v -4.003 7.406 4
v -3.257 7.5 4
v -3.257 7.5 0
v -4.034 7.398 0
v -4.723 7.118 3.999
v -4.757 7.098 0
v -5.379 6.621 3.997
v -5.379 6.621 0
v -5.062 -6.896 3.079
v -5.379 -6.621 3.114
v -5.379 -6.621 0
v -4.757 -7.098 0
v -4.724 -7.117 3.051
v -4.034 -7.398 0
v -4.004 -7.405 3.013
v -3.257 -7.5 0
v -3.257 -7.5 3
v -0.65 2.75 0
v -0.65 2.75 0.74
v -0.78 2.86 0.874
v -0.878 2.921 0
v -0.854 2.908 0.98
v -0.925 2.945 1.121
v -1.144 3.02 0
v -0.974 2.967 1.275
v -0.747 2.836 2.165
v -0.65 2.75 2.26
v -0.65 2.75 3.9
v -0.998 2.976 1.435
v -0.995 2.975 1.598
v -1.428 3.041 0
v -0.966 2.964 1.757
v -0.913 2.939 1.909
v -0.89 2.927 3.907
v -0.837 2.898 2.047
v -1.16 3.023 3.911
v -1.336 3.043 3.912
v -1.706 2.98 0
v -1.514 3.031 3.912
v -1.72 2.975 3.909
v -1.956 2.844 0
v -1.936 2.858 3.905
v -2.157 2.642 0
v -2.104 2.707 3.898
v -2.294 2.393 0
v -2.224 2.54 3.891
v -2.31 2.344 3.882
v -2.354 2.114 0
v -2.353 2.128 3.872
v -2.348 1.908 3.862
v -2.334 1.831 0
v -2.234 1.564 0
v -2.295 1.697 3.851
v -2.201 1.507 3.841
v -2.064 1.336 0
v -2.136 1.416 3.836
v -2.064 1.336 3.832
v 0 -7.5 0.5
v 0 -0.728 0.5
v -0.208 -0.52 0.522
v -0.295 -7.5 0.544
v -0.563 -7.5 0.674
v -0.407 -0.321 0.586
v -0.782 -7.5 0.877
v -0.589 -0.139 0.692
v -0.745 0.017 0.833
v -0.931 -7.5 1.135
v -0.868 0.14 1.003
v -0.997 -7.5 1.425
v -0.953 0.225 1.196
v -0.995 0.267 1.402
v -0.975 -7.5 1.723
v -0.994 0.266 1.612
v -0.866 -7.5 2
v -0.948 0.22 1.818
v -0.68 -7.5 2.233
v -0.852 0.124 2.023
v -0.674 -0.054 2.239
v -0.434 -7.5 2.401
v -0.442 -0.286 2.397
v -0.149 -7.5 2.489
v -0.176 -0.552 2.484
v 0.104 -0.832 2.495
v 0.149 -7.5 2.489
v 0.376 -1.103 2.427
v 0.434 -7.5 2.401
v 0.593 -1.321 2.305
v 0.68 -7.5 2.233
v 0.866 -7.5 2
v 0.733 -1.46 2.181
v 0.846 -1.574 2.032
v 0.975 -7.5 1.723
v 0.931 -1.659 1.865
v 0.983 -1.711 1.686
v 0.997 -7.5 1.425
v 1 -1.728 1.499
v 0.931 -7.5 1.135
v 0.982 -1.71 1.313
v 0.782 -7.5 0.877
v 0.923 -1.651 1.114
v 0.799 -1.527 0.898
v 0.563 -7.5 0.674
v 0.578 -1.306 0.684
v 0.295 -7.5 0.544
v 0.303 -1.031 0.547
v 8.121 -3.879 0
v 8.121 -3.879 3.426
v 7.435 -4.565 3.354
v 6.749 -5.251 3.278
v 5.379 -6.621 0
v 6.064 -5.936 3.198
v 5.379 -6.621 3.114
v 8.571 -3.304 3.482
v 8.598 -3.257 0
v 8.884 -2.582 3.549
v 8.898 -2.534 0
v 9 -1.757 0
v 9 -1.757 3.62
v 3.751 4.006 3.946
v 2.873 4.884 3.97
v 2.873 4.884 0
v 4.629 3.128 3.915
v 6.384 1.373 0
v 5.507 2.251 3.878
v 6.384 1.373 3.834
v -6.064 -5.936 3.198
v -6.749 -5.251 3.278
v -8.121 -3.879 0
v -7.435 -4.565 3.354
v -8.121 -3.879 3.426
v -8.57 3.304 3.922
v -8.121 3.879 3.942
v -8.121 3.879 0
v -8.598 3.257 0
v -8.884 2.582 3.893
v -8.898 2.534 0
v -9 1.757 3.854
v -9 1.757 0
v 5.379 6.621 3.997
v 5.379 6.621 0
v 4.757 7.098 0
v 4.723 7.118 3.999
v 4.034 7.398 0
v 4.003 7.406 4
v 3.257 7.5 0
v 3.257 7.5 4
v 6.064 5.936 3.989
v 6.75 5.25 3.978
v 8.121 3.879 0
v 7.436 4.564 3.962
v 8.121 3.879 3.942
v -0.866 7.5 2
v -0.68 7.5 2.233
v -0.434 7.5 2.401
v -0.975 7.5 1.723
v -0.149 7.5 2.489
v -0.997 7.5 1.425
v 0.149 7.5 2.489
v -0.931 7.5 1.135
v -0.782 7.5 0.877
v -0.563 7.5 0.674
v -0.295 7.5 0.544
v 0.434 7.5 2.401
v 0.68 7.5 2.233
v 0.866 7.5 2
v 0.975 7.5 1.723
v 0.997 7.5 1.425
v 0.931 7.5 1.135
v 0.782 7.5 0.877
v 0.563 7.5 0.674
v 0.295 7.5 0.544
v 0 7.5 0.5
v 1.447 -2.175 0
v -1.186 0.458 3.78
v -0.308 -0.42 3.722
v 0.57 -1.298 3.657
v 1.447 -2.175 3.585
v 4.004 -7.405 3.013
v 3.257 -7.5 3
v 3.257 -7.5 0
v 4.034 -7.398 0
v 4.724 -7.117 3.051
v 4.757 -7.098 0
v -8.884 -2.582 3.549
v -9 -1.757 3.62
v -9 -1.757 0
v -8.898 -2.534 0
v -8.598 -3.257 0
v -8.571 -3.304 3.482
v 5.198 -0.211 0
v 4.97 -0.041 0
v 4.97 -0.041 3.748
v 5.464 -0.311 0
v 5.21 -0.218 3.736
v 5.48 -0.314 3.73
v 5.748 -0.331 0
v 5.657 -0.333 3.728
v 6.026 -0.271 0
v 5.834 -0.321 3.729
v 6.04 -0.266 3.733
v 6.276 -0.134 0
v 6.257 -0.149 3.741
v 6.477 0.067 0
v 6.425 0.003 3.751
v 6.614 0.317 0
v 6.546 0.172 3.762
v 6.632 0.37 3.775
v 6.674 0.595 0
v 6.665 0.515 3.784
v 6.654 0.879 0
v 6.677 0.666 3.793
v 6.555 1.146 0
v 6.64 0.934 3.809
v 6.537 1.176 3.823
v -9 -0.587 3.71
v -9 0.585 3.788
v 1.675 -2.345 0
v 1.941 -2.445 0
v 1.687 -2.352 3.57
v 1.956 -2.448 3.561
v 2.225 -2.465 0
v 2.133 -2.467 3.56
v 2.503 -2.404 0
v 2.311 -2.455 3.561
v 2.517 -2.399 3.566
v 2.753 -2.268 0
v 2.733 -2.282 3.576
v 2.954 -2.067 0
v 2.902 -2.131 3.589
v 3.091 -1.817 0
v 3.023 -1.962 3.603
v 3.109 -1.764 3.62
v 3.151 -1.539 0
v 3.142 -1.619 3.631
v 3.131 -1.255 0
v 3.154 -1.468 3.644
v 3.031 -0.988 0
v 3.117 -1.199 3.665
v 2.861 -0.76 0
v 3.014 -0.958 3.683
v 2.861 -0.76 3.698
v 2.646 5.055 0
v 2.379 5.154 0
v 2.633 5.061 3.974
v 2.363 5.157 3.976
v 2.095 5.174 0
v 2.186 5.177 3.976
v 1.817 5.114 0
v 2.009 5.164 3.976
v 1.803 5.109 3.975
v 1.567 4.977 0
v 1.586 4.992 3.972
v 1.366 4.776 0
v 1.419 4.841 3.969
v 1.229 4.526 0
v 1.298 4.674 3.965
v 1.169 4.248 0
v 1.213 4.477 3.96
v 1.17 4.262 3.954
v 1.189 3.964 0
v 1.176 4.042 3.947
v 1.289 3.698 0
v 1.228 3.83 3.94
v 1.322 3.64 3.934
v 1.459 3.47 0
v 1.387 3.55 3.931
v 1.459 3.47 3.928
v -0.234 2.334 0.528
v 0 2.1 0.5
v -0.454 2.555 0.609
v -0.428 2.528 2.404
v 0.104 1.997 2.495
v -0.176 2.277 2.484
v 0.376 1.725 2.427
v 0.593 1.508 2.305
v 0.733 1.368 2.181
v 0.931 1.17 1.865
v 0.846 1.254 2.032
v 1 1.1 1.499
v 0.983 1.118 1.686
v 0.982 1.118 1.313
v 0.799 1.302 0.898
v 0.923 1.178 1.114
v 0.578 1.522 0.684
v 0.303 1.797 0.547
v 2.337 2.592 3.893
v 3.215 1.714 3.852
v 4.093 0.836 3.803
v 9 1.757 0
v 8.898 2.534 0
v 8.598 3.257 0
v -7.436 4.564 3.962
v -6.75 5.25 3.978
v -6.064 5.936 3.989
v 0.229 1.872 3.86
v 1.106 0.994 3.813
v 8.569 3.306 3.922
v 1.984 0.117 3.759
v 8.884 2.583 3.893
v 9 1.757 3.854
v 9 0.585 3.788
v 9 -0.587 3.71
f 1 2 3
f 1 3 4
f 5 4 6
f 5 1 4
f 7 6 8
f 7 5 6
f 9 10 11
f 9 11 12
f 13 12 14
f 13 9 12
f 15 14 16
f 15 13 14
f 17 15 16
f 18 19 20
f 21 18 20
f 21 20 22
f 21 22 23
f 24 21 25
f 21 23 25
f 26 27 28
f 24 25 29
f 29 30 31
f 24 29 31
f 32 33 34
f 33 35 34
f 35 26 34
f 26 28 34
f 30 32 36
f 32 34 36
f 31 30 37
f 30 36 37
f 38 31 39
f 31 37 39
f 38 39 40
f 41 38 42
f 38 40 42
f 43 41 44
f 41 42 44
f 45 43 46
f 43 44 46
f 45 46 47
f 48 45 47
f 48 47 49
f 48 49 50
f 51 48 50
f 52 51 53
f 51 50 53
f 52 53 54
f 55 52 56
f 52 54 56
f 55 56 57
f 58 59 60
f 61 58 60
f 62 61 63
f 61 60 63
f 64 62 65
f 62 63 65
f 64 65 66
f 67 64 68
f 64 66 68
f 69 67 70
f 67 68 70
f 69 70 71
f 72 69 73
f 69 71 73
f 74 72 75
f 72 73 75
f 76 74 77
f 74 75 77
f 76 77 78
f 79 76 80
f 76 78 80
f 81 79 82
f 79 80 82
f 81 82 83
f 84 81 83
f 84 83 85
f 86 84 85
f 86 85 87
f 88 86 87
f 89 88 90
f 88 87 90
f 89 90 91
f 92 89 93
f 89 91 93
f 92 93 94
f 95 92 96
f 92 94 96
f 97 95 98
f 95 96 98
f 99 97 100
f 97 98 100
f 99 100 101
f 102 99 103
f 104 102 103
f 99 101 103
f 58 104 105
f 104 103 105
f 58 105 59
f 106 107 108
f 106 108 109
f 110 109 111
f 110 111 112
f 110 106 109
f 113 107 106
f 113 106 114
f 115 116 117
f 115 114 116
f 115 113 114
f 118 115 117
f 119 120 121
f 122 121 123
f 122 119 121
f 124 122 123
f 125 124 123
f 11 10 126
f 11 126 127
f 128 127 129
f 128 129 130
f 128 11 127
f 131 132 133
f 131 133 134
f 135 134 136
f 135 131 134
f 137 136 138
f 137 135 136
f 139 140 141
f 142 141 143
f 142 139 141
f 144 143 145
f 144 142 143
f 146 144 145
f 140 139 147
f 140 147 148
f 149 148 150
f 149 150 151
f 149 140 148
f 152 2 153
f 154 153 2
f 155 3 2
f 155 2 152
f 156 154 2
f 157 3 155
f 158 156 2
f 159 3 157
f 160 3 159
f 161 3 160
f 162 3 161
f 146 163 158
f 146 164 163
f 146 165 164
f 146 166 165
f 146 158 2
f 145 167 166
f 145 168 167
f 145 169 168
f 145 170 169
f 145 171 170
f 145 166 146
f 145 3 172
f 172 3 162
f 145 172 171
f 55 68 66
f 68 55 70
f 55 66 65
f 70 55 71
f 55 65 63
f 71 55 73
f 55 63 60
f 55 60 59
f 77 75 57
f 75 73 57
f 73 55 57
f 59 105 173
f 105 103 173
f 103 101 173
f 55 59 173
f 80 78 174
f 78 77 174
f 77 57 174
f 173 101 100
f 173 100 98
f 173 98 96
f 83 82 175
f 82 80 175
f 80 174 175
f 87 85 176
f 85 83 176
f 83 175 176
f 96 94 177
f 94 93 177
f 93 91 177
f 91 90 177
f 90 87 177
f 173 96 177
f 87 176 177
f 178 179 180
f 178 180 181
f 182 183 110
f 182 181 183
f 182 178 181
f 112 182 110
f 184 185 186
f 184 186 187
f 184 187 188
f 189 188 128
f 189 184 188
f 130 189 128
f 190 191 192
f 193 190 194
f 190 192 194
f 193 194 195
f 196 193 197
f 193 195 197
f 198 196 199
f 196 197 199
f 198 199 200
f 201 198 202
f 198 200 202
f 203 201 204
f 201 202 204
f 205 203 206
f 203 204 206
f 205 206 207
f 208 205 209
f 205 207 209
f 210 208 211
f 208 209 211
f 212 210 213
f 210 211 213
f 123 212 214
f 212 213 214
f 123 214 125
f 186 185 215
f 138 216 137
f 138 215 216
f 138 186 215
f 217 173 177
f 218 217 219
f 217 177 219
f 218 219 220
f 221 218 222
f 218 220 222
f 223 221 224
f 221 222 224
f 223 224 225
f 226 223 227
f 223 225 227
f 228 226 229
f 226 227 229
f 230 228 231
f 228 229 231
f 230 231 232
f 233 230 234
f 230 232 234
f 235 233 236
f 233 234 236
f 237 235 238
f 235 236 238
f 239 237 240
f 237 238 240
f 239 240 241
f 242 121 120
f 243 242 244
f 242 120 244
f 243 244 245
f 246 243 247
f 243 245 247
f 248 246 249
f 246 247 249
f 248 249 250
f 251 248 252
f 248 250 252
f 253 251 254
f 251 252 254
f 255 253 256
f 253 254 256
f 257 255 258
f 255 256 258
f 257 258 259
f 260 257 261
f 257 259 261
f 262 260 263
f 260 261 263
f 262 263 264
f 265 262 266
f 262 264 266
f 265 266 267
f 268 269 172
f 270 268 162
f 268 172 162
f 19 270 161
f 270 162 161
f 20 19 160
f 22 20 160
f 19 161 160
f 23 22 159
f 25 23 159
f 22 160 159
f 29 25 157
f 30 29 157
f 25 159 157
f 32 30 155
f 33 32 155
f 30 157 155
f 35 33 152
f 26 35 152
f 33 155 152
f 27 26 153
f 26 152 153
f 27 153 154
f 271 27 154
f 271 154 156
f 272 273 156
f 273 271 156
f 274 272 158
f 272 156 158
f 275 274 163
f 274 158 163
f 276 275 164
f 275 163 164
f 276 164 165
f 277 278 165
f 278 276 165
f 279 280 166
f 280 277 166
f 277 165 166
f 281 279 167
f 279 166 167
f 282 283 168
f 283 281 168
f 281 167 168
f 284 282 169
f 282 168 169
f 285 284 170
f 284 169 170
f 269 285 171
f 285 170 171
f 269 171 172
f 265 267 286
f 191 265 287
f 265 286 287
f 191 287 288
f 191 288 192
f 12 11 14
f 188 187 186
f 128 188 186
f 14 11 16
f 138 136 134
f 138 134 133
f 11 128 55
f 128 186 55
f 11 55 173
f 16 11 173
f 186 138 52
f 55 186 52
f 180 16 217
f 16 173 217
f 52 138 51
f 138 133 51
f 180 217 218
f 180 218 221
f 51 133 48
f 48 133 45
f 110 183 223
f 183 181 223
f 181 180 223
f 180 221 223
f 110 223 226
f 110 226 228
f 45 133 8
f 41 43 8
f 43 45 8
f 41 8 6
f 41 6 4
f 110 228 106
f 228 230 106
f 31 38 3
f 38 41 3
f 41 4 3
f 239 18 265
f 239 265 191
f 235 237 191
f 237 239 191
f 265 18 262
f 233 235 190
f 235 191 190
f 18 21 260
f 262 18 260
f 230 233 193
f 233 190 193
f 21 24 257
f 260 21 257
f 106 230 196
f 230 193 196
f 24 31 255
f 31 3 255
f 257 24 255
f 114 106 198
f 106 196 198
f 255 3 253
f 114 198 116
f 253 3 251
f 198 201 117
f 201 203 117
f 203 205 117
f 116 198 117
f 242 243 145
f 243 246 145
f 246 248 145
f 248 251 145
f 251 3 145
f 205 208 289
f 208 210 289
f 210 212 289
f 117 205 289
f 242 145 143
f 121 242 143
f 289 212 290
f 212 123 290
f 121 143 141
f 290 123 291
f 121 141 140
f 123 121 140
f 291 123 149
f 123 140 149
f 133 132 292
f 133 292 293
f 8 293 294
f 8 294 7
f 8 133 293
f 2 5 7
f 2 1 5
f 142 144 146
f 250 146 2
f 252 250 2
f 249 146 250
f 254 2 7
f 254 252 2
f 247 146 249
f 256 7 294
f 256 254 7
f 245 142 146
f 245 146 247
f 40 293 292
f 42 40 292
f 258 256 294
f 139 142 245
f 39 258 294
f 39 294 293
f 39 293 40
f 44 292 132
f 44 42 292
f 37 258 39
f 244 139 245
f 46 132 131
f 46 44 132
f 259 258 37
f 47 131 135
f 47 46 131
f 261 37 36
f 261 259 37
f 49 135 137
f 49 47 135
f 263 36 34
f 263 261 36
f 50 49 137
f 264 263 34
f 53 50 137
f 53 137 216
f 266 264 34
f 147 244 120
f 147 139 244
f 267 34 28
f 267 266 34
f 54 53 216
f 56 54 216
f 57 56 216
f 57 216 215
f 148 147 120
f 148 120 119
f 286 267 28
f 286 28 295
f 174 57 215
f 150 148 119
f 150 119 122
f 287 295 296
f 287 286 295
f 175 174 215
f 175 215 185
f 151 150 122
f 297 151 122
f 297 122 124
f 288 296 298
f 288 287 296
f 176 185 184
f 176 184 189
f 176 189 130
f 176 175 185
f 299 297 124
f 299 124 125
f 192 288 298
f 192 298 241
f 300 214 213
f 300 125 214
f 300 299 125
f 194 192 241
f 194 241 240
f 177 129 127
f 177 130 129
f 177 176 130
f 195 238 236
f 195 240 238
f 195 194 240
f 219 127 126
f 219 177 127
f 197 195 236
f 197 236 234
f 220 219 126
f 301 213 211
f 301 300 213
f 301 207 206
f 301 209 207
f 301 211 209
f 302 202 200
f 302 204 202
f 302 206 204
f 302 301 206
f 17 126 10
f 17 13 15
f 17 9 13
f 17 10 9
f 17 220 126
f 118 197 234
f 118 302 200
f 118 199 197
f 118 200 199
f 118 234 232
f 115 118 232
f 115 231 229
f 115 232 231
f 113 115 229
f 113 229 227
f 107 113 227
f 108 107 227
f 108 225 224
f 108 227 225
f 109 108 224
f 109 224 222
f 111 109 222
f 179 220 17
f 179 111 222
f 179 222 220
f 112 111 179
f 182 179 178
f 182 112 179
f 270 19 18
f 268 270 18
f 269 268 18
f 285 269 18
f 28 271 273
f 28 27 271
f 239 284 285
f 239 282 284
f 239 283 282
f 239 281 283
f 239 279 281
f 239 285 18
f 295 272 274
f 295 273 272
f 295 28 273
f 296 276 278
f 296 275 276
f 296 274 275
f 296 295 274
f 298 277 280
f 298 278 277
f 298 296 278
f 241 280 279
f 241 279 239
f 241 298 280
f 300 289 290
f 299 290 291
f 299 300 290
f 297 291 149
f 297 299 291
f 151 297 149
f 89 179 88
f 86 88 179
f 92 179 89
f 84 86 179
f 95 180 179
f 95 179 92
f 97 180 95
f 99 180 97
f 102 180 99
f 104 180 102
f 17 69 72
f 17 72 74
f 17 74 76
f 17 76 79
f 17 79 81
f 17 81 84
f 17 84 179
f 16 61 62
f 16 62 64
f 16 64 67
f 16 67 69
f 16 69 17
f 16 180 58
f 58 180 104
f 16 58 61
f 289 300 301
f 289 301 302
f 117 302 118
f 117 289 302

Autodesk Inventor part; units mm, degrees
ref_plane "YZ Plane" through (0, 0, 0) normal (1, 0, 0) x (0, 1, 0)
ref_plane "XZ Plane" through (0, 0, 0) normal (0, 1, 0) x (-1, 0, 0)
ref_plane "XY Plane" through (0, 0, 0) normal (0, 0, 1) x (1, 0, 0)
sketch "Base" plane through (0, 0, 0) normal (0, 0, 1) x (1, 0, 0)
  line L0 (-9, -3) -> (-9, 3)
  line L1 (-9, 3) -> (-4.5, 7.5)
  line L2 (-4.5, 7.5) -> (4.5, 7.5)
  line L3 (4.5, 7.5) -> (9, 3)
  line L4 (9, 3) -> (9, -3)
  line L5 (9, -3) -> (4.5, -7.5)
  line L6 (4.5, -7.5) -> (-4.5, -7.5)
  line L7 (-4.5, -7.5) -> (-9, -3)
  line L8 (-9, 0) -> (9, 0) construction
  line L9 (0, 7.5) -> (0, -7.5) construction
  point P0 (0, 0)
  point P1 (0, 0)
  dimension "d1" = 18
  dimension "d5" = 15
  dimension "d7" = 6
extrude "BaseFeature" add sketch "Base" along normal blind 4
fillet "BaseFilletsFeature" radius 3 8 edges at (-9, -3, 2) (-4.5, -7.5, 2) (4.5, -7.5, 2) (9, -3, 2) (9, 3, 2) (4.5, 7.5, 2) (-4.5, 7.5, 2) (-9, 3, 2)
sketch "RailHoles" plane through (0, 0, 4) normal (0, 0, 1) x (1, 0, 0)
  line L0 (2.1663, 4.1769) -> (5.6769, 0.6663) construction
  line L1 (-1.3568, 2.0431) -> (2.1538, -1.4675) construction
  line L2 (8.1213, 3.8787) -> (5.3787, 6.6213) construction
  line L3 (6.75, 5.25) -> (3.9216, 2.4216) construction
  circle A0 centre (2.1663, 4.1769) radius 1
  circle A1 centre (5.6769, 0.6663) radius 1
  circle A2 centre (-1.3568, 2.0431) radius 1
  circle A3 centre (2.1538, -1.4675) radius 1
  line L4 (2.8734, 4.884) -> (6.384, 1.3734)
  line L5 (1.4592, 3.4698) -> (4.9698, -0.0408)
  line L6 (-0.6497, 2.7502) -> (2.8609, -0.7604)
  line L7 (-2.0639, 1.336) -> (1.4467, -2.1746)
  dimension "d11" = 4
  dimension "d12" = 4
  dimension "d13" = 4.9647
  dimension "d14" = 2
  dimension "d15" = 1.5
  dimension "d25" = 3.8787
extrude "RailHolesFeature" cut sketch "RailHoles" against normal through all
sketch "RouteHole" plane through (-3.2574, -7.5, 0) normal (0, -1, 0) x (1, 0, 0)
  line L0 (6.5147, 4) -> (6.5147, 0) construction
  line L1 (0, 4) -> (6.5147, 4) construction
  line L2 (0, 0) -> (0, 4) construction
  line L3 (6.5147, 0) -> (0, 0) construction
  line L4 (0, 4) -> (0, 0) construction
  line L5 (0, 4) -> (6.5147, 4) construction
  line L6 (3.2574, 4) -> (3.2574, 0) construction
  line L7 (6.5147, 0) -> (0, 0) construction
  circle A0 centre (3.2574, 1.5) radius 1.25
  dimension "d40" = 2.5
  dimension "d41" = 1.5
hole "RouteHoleFeature" at (0, -7.5, 1.5) direction (0, 1, 0) diameter 2 end through all
sketch "SideProfile" plane through (9, -1.7574, 0) normal (1, 0, 0) x (0, 0, -1)
  arc A0 (-4, 9.2574) -> (-3, -5.7426) centre (109, 9.2574) ccw
  line L0 (-4, -5.7426) -> (0, -5.7426) construction
  line L1 (0, 9.2574) -> (-4, 9.2574) construction
  line L2 (-3, -5.7426) -> (0, -5.7426)
  line L3 (0, 9.2574) -> (0, -5.7426)
  line L4 (0, 9.2574) -> (0, 8.3787) projected
  line L5 (0, 9.2574) -> (-4, 9.2574)
  line L6 (-4, -2.1213) -> (-4, 0) construction
  dimension "d36" = 4
  dimension "d39" = 3
extrude "SideProfileFeature" cut sketch "SideProfile" against normal through all keep common part
equation "\"d7\" = 0.4 * d5"
equation "\"d12\" = 2 * d14"
equation "\"d13\" = 1.28 * d25"
properties part number "IndexRouter"
